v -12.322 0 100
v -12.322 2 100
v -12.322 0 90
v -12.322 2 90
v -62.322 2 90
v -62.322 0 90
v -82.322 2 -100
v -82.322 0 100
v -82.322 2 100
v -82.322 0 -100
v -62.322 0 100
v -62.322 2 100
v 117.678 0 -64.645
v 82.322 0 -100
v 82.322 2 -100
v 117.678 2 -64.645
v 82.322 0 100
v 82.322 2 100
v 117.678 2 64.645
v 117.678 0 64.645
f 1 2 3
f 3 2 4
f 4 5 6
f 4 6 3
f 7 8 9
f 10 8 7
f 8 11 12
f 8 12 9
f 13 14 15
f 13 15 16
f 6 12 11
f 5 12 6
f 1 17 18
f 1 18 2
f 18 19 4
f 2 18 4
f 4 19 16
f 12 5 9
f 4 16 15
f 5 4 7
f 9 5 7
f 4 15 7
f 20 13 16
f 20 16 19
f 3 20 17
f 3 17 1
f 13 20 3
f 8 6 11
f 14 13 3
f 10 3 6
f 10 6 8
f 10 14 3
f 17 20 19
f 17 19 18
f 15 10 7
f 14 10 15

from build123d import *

# Parameters (mm, degrees)
BOSS_EXTRUDE1_DEPTH = 2
SKETCH2_W           = 50
SKETCH2_H           = 10
CUT_EXTRUDE1_DEPTH  = 155.441036988


with BuildPart() as part:
    # Sketch1 → Boss-Extrude1 (new body)
    with BuildSketch(Plane(origin=(0, 0, 0), x_dir=(1, 0, 0), z_dir=(0, 1, 0))):
        Polygon((-82.32233047, 100), (82.32233047, 100), (117.67766953, 64.644660941), (117.67766953, -64.644660941), (82.32233047, -100), (-82.32233047, -100), align=None)
    extrude(amount=BOSS_EXTRUDE1_DEPTH)

    # Sketch2 → Cut-Extrude1 (cut, through all)
    with BuildSketch(Plane(origin=(0, 2, 0), x_dir=(1, 0, 0), z_dir=(0, 1, 0))):
        with Locations((-37.32233047, -95)):
            Rectangle(SKETCH2_W, SKETCH2_H)
    extrude(amount=-CUT_EXTRUDE1_DEPTH, mode=Mode.SUBTRACT)


solid = part.part
